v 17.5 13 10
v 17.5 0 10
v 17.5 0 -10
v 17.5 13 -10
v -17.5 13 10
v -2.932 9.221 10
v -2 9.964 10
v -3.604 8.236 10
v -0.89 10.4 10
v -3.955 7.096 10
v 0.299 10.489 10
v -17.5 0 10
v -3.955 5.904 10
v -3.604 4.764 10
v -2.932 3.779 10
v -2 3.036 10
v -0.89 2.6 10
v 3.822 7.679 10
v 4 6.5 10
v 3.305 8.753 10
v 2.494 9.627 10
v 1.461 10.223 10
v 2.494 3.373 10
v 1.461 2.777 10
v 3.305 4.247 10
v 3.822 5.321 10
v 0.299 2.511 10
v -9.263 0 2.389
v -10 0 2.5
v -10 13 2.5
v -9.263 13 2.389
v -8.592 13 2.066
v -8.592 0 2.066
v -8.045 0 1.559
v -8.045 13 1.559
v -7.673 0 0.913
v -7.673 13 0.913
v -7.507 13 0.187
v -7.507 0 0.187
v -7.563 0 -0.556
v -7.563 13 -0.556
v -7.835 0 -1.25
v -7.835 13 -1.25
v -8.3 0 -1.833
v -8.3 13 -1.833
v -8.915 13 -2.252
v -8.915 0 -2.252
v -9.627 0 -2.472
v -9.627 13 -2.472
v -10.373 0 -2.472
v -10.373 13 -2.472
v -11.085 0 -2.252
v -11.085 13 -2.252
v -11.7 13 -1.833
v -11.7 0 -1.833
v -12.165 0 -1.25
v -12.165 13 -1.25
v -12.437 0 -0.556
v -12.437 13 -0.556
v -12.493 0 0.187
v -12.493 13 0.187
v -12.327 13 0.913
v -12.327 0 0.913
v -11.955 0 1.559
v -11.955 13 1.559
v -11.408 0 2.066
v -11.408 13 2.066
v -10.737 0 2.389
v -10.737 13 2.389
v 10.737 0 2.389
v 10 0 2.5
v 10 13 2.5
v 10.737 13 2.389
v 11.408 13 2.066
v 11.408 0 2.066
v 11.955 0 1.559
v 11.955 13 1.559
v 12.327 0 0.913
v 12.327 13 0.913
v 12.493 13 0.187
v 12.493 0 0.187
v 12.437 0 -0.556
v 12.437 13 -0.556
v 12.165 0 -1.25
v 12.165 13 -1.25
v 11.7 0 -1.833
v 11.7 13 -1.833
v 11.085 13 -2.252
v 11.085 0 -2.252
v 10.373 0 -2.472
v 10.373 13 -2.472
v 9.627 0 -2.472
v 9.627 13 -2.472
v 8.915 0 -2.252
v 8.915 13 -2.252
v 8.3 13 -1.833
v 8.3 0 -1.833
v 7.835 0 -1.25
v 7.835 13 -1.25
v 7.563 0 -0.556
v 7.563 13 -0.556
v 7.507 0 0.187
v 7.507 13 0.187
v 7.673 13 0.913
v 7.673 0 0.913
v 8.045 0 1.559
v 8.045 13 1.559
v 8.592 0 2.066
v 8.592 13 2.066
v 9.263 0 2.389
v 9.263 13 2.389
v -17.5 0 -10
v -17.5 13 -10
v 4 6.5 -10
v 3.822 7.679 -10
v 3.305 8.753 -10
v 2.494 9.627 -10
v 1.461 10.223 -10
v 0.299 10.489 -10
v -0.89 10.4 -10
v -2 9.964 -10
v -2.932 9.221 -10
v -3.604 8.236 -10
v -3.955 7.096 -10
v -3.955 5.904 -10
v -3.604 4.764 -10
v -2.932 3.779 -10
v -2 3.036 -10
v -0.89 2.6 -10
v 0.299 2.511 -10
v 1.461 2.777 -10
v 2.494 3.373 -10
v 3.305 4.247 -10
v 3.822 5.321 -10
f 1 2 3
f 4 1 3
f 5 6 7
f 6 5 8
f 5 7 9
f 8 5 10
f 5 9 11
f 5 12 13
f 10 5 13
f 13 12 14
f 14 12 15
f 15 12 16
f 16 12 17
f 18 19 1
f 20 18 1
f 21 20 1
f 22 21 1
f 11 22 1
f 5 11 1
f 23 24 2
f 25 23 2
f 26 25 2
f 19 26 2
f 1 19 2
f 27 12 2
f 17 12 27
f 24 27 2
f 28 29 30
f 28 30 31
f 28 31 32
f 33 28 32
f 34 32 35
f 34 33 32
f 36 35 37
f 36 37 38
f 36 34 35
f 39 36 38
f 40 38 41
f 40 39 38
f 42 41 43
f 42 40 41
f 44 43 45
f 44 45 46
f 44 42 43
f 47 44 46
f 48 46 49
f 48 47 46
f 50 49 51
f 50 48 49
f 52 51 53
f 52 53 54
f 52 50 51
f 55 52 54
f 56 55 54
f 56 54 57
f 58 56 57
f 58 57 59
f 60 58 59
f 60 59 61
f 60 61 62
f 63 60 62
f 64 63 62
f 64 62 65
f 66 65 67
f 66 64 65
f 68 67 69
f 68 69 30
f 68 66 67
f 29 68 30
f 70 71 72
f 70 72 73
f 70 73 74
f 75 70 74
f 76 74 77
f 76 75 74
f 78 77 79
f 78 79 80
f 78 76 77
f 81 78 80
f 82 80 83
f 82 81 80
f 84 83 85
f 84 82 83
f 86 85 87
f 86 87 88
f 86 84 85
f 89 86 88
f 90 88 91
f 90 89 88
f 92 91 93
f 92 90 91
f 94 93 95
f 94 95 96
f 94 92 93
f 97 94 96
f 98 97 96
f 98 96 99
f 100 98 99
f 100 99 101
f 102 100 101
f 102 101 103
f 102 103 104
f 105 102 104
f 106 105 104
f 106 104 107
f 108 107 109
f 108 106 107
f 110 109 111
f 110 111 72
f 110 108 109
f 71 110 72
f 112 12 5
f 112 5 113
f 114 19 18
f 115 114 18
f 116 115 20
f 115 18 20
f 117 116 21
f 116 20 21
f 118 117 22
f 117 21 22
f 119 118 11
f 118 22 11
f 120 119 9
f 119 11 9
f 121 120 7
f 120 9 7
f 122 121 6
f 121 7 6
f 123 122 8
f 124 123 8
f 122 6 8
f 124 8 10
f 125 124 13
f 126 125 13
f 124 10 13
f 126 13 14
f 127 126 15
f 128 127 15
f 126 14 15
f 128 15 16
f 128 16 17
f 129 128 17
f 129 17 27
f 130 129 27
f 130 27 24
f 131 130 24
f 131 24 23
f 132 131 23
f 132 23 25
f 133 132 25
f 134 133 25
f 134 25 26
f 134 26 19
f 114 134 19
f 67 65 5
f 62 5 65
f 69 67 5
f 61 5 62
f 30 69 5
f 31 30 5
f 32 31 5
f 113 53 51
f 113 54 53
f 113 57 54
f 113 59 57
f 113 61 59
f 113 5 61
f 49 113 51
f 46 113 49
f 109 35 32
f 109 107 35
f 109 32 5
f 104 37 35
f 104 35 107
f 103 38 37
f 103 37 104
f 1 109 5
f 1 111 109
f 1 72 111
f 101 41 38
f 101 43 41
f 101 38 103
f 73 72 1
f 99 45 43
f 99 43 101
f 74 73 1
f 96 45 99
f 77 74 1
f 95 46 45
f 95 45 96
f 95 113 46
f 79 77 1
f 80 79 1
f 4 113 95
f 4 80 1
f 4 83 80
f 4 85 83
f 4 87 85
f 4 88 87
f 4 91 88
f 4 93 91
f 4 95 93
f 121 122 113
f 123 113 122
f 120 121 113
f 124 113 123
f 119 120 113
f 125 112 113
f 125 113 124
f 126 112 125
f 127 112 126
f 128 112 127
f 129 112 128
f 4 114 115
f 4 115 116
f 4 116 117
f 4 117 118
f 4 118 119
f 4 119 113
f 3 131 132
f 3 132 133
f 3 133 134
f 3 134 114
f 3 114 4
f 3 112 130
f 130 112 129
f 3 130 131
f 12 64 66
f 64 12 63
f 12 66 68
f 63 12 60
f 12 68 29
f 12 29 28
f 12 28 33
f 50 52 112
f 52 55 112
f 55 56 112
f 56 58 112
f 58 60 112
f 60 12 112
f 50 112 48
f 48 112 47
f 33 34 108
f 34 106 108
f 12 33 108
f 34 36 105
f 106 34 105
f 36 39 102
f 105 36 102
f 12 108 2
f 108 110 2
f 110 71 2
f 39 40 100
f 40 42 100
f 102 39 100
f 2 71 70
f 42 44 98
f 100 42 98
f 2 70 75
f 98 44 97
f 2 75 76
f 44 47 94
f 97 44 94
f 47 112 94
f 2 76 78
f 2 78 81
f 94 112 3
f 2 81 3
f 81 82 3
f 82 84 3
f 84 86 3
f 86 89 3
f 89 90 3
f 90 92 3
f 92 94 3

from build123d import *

# Parameters (mm, degrees)
SKETCH1_W           = 35
SKETCH1_H           = 20
SKETCH1_R           = 2.5
BOSS_EXTRUDE1_DEPTH = 13
SKETCH2_R           = 4
CUT_EXTRUDE1_DEPTH  = 30.584624385


with BuildPart() as part:
    # Sketch1 → Boss-Extrude1 (new body)
    with BuildSketch(Plane(origin=(0, 0, 0), x_dir=(1, 0, 0), z_dir=(0, 1, 0))):
        Rectangle(SKETCH1_W, SKETCH1_H)
        with Locations(Location((-10, 0, 0), (0, 0, 270))):
            Circle(SKETCH1_R, mode=Mode.SUBTRACT)
        with Locations(Location((10, 0, 0), (0, 0, 270))):
            Circle(SKETCH1_R, mode=Mode.SUBTRACT)
    extrude(amount=BOSS_EXTRUDE1_DEPTH)

    # Sketch2 → Cut-Extrude1 (cut, through all)
    with BuildSketch(Plane.XY.offset(10)):
        with Locations((0, 6.5)):
            Circle(SKETCH2_R)
    extrude(amount=-CUT_EXTRUDE1_DEPTH, mode=Mode.SUBTRACT)


solid = part.part
